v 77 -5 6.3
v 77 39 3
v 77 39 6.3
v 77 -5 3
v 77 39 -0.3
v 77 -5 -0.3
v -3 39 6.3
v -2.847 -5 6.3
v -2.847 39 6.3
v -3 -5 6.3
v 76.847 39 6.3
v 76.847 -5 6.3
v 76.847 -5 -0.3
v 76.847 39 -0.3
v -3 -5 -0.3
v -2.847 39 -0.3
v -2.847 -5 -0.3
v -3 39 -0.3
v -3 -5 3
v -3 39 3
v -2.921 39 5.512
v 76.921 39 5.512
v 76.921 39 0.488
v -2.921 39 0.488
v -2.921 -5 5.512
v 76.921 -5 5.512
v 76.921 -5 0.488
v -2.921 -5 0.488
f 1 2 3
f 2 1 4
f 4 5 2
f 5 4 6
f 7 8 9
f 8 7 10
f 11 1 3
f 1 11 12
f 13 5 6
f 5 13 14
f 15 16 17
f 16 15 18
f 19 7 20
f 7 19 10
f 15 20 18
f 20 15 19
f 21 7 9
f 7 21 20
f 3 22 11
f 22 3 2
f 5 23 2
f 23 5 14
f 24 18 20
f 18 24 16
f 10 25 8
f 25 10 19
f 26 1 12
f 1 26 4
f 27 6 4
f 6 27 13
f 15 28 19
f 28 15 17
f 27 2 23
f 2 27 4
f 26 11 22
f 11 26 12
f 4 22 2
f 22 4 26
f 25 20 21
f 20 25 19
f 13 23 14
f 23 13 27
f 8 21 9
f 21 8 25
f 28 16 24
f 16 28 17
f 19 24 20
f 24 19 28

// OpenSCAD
// measurements of the chip
chip_x = 80; 
chip_y = 40;
chip_z = 6;
chip_r = 3;

// well diameter 
well_Do = 1.5;
well_di = 0.3;
well_h = well_Do*2;

// multiplier 
multp_x = 0.85;

// determine the number of wells in each row and column 
ii = floor(chip_x/well_Do/multp_x-8);
jj = floor(chip_y/well_Do-4);

// size the reservoir based on the footprint of the well
reservoir_x = ii*well_Do*multp_x;
reservoir_y = jj*well_Do + well_Do*1.5;
reservoir_z = chip_z - well_h - 1;

// mounting holes 
// https://armstrongmetalcrafts.com/Reference/MetricTapChart.aspx
// tap holes 1.55-1.6 mm for 2mm bolt 
mount_D = 1.6; 

//build_inserts();

fillet_base_x();

//color([.1, .3, .3, .25]) build_chip();

//fillet_base_x();
//mounting_holes();
//integrate_manifold();
//color([.1, .3, .3, .25]) build_base();

//union(){
//build_crate();
//build_reservoir();
//build_inserts();
//}


module fillet_base_x(){
     
    translate([chip_x/2 - chip_r, chip_y/2 - chip_r, chip_z/2])
    difference(){
    cube([chip_x, 1.1*chip_y, 1.1*chip_z], center = true);
    
    rotate([90, 0, 0])    
    cylinder(h = 2*chip_y, r1 = chip_x/2, r2 = chip_x/2, center = true, $fn = 100);  
    }
       
    }


module build_chip(){
    
    difference(){
        build_base();
        integrate_manifold();
        mounting_holes();
        fillet_base_x();
        } 
    }

module mounting_holes(){
    
     a=[[0,0],[mount_D, 0], [mount_D/2, mount_D/2], [mount_D/2, chip_z-mount_D/2],[mount_D, chip_z], [0, chip_z]];
    
    for (i = [0:1]){ 
        translate ([(chip_x - 2*chip_r), i*(chip_y - 2*chip_r), 0])
        rotate_extrude($fn = 100)
        polygon(a);
    }}

module integrate_manifold(){
    
    color([.6, .1, .1, .5])
    union(){
        
        build_inserts();
        build_reservoir();
        build_crate();
        }
    
    }


module build_base(){
    
    translate([-2*well_Do, -2*well_Do, 0])
    union(){
    translate([2*well_Do, 0, 0])
    cube([chip_x - 2*chip_r , chip_y, chip_z], center=false);
    
    for (i = [0:1]){ for (j = [0:1]){      
    translate([i*(chip_x - 2*chip_r) + chip_r , j*(chip_y - 2*chip_r) + chip_r ,0])
    cylinder(h = chip_z, r1 = chip_r, r2 = chip_r, center = false, $fn = 100); 
    }
    translate([i*(chip_x - chip_r), chip_r, 0])
    cube([chip_r , chip_y-2*chip_r , chip_z], center=false);
    
    }}} 


module build_inserts(){
    
    
    for (i = [1:2]){  
    translate([0, 0, well_h+reservoir_z/2])
    translate([0, i*reservoir_y/3 ,0])
    rotate([0,90,0])
    cylinder(h = chip_x, r1 = reservoir_z/2, r2 = mount_D/2, center = false, $fn = 100); 
 
    
    }}


module build_reservoir(){
    
    translate([0, -well_Do/2, well_h])
    union(){
    cube([reservoir_x , reservoir_y , reservoir_z], center=false);
    
    for (i = [0:1]){ for (j = [0:1]){      
    translate([i*reservoir_x , j*(reservoir_y-well_Do) +well_Do/2 ,0])
    cylinder(h = reservoir_z, r1 = well_Do/2, r2 = well_Do/2, center = false, $fn = 100); 
    }
    translate([i*reservoir_x-well_Do/2,well_Do/2,0])
    cube([well_Do , reservoir_y-well_Do , reservoir_z], center=false);
    
    }}}

module build_crate(){
    
     for (i = [0:ii]){ for (j = [0:jj]){   
     
     translate([i*well_Do*multp_x, j*well_Do + i%2*well_Do/2,0])
     
     union(){
     cylinder(h = well_h, r1 = well_di/2, r2 = well_Do/2, center = false, $fn = 100); 
         
     translate([0,0,well_h])
     cylinder(h = chip_z-well_h+1, r1 = well_Do/2, r2 = well_di, center = false, $fn = 100); 
        
    }}}}
